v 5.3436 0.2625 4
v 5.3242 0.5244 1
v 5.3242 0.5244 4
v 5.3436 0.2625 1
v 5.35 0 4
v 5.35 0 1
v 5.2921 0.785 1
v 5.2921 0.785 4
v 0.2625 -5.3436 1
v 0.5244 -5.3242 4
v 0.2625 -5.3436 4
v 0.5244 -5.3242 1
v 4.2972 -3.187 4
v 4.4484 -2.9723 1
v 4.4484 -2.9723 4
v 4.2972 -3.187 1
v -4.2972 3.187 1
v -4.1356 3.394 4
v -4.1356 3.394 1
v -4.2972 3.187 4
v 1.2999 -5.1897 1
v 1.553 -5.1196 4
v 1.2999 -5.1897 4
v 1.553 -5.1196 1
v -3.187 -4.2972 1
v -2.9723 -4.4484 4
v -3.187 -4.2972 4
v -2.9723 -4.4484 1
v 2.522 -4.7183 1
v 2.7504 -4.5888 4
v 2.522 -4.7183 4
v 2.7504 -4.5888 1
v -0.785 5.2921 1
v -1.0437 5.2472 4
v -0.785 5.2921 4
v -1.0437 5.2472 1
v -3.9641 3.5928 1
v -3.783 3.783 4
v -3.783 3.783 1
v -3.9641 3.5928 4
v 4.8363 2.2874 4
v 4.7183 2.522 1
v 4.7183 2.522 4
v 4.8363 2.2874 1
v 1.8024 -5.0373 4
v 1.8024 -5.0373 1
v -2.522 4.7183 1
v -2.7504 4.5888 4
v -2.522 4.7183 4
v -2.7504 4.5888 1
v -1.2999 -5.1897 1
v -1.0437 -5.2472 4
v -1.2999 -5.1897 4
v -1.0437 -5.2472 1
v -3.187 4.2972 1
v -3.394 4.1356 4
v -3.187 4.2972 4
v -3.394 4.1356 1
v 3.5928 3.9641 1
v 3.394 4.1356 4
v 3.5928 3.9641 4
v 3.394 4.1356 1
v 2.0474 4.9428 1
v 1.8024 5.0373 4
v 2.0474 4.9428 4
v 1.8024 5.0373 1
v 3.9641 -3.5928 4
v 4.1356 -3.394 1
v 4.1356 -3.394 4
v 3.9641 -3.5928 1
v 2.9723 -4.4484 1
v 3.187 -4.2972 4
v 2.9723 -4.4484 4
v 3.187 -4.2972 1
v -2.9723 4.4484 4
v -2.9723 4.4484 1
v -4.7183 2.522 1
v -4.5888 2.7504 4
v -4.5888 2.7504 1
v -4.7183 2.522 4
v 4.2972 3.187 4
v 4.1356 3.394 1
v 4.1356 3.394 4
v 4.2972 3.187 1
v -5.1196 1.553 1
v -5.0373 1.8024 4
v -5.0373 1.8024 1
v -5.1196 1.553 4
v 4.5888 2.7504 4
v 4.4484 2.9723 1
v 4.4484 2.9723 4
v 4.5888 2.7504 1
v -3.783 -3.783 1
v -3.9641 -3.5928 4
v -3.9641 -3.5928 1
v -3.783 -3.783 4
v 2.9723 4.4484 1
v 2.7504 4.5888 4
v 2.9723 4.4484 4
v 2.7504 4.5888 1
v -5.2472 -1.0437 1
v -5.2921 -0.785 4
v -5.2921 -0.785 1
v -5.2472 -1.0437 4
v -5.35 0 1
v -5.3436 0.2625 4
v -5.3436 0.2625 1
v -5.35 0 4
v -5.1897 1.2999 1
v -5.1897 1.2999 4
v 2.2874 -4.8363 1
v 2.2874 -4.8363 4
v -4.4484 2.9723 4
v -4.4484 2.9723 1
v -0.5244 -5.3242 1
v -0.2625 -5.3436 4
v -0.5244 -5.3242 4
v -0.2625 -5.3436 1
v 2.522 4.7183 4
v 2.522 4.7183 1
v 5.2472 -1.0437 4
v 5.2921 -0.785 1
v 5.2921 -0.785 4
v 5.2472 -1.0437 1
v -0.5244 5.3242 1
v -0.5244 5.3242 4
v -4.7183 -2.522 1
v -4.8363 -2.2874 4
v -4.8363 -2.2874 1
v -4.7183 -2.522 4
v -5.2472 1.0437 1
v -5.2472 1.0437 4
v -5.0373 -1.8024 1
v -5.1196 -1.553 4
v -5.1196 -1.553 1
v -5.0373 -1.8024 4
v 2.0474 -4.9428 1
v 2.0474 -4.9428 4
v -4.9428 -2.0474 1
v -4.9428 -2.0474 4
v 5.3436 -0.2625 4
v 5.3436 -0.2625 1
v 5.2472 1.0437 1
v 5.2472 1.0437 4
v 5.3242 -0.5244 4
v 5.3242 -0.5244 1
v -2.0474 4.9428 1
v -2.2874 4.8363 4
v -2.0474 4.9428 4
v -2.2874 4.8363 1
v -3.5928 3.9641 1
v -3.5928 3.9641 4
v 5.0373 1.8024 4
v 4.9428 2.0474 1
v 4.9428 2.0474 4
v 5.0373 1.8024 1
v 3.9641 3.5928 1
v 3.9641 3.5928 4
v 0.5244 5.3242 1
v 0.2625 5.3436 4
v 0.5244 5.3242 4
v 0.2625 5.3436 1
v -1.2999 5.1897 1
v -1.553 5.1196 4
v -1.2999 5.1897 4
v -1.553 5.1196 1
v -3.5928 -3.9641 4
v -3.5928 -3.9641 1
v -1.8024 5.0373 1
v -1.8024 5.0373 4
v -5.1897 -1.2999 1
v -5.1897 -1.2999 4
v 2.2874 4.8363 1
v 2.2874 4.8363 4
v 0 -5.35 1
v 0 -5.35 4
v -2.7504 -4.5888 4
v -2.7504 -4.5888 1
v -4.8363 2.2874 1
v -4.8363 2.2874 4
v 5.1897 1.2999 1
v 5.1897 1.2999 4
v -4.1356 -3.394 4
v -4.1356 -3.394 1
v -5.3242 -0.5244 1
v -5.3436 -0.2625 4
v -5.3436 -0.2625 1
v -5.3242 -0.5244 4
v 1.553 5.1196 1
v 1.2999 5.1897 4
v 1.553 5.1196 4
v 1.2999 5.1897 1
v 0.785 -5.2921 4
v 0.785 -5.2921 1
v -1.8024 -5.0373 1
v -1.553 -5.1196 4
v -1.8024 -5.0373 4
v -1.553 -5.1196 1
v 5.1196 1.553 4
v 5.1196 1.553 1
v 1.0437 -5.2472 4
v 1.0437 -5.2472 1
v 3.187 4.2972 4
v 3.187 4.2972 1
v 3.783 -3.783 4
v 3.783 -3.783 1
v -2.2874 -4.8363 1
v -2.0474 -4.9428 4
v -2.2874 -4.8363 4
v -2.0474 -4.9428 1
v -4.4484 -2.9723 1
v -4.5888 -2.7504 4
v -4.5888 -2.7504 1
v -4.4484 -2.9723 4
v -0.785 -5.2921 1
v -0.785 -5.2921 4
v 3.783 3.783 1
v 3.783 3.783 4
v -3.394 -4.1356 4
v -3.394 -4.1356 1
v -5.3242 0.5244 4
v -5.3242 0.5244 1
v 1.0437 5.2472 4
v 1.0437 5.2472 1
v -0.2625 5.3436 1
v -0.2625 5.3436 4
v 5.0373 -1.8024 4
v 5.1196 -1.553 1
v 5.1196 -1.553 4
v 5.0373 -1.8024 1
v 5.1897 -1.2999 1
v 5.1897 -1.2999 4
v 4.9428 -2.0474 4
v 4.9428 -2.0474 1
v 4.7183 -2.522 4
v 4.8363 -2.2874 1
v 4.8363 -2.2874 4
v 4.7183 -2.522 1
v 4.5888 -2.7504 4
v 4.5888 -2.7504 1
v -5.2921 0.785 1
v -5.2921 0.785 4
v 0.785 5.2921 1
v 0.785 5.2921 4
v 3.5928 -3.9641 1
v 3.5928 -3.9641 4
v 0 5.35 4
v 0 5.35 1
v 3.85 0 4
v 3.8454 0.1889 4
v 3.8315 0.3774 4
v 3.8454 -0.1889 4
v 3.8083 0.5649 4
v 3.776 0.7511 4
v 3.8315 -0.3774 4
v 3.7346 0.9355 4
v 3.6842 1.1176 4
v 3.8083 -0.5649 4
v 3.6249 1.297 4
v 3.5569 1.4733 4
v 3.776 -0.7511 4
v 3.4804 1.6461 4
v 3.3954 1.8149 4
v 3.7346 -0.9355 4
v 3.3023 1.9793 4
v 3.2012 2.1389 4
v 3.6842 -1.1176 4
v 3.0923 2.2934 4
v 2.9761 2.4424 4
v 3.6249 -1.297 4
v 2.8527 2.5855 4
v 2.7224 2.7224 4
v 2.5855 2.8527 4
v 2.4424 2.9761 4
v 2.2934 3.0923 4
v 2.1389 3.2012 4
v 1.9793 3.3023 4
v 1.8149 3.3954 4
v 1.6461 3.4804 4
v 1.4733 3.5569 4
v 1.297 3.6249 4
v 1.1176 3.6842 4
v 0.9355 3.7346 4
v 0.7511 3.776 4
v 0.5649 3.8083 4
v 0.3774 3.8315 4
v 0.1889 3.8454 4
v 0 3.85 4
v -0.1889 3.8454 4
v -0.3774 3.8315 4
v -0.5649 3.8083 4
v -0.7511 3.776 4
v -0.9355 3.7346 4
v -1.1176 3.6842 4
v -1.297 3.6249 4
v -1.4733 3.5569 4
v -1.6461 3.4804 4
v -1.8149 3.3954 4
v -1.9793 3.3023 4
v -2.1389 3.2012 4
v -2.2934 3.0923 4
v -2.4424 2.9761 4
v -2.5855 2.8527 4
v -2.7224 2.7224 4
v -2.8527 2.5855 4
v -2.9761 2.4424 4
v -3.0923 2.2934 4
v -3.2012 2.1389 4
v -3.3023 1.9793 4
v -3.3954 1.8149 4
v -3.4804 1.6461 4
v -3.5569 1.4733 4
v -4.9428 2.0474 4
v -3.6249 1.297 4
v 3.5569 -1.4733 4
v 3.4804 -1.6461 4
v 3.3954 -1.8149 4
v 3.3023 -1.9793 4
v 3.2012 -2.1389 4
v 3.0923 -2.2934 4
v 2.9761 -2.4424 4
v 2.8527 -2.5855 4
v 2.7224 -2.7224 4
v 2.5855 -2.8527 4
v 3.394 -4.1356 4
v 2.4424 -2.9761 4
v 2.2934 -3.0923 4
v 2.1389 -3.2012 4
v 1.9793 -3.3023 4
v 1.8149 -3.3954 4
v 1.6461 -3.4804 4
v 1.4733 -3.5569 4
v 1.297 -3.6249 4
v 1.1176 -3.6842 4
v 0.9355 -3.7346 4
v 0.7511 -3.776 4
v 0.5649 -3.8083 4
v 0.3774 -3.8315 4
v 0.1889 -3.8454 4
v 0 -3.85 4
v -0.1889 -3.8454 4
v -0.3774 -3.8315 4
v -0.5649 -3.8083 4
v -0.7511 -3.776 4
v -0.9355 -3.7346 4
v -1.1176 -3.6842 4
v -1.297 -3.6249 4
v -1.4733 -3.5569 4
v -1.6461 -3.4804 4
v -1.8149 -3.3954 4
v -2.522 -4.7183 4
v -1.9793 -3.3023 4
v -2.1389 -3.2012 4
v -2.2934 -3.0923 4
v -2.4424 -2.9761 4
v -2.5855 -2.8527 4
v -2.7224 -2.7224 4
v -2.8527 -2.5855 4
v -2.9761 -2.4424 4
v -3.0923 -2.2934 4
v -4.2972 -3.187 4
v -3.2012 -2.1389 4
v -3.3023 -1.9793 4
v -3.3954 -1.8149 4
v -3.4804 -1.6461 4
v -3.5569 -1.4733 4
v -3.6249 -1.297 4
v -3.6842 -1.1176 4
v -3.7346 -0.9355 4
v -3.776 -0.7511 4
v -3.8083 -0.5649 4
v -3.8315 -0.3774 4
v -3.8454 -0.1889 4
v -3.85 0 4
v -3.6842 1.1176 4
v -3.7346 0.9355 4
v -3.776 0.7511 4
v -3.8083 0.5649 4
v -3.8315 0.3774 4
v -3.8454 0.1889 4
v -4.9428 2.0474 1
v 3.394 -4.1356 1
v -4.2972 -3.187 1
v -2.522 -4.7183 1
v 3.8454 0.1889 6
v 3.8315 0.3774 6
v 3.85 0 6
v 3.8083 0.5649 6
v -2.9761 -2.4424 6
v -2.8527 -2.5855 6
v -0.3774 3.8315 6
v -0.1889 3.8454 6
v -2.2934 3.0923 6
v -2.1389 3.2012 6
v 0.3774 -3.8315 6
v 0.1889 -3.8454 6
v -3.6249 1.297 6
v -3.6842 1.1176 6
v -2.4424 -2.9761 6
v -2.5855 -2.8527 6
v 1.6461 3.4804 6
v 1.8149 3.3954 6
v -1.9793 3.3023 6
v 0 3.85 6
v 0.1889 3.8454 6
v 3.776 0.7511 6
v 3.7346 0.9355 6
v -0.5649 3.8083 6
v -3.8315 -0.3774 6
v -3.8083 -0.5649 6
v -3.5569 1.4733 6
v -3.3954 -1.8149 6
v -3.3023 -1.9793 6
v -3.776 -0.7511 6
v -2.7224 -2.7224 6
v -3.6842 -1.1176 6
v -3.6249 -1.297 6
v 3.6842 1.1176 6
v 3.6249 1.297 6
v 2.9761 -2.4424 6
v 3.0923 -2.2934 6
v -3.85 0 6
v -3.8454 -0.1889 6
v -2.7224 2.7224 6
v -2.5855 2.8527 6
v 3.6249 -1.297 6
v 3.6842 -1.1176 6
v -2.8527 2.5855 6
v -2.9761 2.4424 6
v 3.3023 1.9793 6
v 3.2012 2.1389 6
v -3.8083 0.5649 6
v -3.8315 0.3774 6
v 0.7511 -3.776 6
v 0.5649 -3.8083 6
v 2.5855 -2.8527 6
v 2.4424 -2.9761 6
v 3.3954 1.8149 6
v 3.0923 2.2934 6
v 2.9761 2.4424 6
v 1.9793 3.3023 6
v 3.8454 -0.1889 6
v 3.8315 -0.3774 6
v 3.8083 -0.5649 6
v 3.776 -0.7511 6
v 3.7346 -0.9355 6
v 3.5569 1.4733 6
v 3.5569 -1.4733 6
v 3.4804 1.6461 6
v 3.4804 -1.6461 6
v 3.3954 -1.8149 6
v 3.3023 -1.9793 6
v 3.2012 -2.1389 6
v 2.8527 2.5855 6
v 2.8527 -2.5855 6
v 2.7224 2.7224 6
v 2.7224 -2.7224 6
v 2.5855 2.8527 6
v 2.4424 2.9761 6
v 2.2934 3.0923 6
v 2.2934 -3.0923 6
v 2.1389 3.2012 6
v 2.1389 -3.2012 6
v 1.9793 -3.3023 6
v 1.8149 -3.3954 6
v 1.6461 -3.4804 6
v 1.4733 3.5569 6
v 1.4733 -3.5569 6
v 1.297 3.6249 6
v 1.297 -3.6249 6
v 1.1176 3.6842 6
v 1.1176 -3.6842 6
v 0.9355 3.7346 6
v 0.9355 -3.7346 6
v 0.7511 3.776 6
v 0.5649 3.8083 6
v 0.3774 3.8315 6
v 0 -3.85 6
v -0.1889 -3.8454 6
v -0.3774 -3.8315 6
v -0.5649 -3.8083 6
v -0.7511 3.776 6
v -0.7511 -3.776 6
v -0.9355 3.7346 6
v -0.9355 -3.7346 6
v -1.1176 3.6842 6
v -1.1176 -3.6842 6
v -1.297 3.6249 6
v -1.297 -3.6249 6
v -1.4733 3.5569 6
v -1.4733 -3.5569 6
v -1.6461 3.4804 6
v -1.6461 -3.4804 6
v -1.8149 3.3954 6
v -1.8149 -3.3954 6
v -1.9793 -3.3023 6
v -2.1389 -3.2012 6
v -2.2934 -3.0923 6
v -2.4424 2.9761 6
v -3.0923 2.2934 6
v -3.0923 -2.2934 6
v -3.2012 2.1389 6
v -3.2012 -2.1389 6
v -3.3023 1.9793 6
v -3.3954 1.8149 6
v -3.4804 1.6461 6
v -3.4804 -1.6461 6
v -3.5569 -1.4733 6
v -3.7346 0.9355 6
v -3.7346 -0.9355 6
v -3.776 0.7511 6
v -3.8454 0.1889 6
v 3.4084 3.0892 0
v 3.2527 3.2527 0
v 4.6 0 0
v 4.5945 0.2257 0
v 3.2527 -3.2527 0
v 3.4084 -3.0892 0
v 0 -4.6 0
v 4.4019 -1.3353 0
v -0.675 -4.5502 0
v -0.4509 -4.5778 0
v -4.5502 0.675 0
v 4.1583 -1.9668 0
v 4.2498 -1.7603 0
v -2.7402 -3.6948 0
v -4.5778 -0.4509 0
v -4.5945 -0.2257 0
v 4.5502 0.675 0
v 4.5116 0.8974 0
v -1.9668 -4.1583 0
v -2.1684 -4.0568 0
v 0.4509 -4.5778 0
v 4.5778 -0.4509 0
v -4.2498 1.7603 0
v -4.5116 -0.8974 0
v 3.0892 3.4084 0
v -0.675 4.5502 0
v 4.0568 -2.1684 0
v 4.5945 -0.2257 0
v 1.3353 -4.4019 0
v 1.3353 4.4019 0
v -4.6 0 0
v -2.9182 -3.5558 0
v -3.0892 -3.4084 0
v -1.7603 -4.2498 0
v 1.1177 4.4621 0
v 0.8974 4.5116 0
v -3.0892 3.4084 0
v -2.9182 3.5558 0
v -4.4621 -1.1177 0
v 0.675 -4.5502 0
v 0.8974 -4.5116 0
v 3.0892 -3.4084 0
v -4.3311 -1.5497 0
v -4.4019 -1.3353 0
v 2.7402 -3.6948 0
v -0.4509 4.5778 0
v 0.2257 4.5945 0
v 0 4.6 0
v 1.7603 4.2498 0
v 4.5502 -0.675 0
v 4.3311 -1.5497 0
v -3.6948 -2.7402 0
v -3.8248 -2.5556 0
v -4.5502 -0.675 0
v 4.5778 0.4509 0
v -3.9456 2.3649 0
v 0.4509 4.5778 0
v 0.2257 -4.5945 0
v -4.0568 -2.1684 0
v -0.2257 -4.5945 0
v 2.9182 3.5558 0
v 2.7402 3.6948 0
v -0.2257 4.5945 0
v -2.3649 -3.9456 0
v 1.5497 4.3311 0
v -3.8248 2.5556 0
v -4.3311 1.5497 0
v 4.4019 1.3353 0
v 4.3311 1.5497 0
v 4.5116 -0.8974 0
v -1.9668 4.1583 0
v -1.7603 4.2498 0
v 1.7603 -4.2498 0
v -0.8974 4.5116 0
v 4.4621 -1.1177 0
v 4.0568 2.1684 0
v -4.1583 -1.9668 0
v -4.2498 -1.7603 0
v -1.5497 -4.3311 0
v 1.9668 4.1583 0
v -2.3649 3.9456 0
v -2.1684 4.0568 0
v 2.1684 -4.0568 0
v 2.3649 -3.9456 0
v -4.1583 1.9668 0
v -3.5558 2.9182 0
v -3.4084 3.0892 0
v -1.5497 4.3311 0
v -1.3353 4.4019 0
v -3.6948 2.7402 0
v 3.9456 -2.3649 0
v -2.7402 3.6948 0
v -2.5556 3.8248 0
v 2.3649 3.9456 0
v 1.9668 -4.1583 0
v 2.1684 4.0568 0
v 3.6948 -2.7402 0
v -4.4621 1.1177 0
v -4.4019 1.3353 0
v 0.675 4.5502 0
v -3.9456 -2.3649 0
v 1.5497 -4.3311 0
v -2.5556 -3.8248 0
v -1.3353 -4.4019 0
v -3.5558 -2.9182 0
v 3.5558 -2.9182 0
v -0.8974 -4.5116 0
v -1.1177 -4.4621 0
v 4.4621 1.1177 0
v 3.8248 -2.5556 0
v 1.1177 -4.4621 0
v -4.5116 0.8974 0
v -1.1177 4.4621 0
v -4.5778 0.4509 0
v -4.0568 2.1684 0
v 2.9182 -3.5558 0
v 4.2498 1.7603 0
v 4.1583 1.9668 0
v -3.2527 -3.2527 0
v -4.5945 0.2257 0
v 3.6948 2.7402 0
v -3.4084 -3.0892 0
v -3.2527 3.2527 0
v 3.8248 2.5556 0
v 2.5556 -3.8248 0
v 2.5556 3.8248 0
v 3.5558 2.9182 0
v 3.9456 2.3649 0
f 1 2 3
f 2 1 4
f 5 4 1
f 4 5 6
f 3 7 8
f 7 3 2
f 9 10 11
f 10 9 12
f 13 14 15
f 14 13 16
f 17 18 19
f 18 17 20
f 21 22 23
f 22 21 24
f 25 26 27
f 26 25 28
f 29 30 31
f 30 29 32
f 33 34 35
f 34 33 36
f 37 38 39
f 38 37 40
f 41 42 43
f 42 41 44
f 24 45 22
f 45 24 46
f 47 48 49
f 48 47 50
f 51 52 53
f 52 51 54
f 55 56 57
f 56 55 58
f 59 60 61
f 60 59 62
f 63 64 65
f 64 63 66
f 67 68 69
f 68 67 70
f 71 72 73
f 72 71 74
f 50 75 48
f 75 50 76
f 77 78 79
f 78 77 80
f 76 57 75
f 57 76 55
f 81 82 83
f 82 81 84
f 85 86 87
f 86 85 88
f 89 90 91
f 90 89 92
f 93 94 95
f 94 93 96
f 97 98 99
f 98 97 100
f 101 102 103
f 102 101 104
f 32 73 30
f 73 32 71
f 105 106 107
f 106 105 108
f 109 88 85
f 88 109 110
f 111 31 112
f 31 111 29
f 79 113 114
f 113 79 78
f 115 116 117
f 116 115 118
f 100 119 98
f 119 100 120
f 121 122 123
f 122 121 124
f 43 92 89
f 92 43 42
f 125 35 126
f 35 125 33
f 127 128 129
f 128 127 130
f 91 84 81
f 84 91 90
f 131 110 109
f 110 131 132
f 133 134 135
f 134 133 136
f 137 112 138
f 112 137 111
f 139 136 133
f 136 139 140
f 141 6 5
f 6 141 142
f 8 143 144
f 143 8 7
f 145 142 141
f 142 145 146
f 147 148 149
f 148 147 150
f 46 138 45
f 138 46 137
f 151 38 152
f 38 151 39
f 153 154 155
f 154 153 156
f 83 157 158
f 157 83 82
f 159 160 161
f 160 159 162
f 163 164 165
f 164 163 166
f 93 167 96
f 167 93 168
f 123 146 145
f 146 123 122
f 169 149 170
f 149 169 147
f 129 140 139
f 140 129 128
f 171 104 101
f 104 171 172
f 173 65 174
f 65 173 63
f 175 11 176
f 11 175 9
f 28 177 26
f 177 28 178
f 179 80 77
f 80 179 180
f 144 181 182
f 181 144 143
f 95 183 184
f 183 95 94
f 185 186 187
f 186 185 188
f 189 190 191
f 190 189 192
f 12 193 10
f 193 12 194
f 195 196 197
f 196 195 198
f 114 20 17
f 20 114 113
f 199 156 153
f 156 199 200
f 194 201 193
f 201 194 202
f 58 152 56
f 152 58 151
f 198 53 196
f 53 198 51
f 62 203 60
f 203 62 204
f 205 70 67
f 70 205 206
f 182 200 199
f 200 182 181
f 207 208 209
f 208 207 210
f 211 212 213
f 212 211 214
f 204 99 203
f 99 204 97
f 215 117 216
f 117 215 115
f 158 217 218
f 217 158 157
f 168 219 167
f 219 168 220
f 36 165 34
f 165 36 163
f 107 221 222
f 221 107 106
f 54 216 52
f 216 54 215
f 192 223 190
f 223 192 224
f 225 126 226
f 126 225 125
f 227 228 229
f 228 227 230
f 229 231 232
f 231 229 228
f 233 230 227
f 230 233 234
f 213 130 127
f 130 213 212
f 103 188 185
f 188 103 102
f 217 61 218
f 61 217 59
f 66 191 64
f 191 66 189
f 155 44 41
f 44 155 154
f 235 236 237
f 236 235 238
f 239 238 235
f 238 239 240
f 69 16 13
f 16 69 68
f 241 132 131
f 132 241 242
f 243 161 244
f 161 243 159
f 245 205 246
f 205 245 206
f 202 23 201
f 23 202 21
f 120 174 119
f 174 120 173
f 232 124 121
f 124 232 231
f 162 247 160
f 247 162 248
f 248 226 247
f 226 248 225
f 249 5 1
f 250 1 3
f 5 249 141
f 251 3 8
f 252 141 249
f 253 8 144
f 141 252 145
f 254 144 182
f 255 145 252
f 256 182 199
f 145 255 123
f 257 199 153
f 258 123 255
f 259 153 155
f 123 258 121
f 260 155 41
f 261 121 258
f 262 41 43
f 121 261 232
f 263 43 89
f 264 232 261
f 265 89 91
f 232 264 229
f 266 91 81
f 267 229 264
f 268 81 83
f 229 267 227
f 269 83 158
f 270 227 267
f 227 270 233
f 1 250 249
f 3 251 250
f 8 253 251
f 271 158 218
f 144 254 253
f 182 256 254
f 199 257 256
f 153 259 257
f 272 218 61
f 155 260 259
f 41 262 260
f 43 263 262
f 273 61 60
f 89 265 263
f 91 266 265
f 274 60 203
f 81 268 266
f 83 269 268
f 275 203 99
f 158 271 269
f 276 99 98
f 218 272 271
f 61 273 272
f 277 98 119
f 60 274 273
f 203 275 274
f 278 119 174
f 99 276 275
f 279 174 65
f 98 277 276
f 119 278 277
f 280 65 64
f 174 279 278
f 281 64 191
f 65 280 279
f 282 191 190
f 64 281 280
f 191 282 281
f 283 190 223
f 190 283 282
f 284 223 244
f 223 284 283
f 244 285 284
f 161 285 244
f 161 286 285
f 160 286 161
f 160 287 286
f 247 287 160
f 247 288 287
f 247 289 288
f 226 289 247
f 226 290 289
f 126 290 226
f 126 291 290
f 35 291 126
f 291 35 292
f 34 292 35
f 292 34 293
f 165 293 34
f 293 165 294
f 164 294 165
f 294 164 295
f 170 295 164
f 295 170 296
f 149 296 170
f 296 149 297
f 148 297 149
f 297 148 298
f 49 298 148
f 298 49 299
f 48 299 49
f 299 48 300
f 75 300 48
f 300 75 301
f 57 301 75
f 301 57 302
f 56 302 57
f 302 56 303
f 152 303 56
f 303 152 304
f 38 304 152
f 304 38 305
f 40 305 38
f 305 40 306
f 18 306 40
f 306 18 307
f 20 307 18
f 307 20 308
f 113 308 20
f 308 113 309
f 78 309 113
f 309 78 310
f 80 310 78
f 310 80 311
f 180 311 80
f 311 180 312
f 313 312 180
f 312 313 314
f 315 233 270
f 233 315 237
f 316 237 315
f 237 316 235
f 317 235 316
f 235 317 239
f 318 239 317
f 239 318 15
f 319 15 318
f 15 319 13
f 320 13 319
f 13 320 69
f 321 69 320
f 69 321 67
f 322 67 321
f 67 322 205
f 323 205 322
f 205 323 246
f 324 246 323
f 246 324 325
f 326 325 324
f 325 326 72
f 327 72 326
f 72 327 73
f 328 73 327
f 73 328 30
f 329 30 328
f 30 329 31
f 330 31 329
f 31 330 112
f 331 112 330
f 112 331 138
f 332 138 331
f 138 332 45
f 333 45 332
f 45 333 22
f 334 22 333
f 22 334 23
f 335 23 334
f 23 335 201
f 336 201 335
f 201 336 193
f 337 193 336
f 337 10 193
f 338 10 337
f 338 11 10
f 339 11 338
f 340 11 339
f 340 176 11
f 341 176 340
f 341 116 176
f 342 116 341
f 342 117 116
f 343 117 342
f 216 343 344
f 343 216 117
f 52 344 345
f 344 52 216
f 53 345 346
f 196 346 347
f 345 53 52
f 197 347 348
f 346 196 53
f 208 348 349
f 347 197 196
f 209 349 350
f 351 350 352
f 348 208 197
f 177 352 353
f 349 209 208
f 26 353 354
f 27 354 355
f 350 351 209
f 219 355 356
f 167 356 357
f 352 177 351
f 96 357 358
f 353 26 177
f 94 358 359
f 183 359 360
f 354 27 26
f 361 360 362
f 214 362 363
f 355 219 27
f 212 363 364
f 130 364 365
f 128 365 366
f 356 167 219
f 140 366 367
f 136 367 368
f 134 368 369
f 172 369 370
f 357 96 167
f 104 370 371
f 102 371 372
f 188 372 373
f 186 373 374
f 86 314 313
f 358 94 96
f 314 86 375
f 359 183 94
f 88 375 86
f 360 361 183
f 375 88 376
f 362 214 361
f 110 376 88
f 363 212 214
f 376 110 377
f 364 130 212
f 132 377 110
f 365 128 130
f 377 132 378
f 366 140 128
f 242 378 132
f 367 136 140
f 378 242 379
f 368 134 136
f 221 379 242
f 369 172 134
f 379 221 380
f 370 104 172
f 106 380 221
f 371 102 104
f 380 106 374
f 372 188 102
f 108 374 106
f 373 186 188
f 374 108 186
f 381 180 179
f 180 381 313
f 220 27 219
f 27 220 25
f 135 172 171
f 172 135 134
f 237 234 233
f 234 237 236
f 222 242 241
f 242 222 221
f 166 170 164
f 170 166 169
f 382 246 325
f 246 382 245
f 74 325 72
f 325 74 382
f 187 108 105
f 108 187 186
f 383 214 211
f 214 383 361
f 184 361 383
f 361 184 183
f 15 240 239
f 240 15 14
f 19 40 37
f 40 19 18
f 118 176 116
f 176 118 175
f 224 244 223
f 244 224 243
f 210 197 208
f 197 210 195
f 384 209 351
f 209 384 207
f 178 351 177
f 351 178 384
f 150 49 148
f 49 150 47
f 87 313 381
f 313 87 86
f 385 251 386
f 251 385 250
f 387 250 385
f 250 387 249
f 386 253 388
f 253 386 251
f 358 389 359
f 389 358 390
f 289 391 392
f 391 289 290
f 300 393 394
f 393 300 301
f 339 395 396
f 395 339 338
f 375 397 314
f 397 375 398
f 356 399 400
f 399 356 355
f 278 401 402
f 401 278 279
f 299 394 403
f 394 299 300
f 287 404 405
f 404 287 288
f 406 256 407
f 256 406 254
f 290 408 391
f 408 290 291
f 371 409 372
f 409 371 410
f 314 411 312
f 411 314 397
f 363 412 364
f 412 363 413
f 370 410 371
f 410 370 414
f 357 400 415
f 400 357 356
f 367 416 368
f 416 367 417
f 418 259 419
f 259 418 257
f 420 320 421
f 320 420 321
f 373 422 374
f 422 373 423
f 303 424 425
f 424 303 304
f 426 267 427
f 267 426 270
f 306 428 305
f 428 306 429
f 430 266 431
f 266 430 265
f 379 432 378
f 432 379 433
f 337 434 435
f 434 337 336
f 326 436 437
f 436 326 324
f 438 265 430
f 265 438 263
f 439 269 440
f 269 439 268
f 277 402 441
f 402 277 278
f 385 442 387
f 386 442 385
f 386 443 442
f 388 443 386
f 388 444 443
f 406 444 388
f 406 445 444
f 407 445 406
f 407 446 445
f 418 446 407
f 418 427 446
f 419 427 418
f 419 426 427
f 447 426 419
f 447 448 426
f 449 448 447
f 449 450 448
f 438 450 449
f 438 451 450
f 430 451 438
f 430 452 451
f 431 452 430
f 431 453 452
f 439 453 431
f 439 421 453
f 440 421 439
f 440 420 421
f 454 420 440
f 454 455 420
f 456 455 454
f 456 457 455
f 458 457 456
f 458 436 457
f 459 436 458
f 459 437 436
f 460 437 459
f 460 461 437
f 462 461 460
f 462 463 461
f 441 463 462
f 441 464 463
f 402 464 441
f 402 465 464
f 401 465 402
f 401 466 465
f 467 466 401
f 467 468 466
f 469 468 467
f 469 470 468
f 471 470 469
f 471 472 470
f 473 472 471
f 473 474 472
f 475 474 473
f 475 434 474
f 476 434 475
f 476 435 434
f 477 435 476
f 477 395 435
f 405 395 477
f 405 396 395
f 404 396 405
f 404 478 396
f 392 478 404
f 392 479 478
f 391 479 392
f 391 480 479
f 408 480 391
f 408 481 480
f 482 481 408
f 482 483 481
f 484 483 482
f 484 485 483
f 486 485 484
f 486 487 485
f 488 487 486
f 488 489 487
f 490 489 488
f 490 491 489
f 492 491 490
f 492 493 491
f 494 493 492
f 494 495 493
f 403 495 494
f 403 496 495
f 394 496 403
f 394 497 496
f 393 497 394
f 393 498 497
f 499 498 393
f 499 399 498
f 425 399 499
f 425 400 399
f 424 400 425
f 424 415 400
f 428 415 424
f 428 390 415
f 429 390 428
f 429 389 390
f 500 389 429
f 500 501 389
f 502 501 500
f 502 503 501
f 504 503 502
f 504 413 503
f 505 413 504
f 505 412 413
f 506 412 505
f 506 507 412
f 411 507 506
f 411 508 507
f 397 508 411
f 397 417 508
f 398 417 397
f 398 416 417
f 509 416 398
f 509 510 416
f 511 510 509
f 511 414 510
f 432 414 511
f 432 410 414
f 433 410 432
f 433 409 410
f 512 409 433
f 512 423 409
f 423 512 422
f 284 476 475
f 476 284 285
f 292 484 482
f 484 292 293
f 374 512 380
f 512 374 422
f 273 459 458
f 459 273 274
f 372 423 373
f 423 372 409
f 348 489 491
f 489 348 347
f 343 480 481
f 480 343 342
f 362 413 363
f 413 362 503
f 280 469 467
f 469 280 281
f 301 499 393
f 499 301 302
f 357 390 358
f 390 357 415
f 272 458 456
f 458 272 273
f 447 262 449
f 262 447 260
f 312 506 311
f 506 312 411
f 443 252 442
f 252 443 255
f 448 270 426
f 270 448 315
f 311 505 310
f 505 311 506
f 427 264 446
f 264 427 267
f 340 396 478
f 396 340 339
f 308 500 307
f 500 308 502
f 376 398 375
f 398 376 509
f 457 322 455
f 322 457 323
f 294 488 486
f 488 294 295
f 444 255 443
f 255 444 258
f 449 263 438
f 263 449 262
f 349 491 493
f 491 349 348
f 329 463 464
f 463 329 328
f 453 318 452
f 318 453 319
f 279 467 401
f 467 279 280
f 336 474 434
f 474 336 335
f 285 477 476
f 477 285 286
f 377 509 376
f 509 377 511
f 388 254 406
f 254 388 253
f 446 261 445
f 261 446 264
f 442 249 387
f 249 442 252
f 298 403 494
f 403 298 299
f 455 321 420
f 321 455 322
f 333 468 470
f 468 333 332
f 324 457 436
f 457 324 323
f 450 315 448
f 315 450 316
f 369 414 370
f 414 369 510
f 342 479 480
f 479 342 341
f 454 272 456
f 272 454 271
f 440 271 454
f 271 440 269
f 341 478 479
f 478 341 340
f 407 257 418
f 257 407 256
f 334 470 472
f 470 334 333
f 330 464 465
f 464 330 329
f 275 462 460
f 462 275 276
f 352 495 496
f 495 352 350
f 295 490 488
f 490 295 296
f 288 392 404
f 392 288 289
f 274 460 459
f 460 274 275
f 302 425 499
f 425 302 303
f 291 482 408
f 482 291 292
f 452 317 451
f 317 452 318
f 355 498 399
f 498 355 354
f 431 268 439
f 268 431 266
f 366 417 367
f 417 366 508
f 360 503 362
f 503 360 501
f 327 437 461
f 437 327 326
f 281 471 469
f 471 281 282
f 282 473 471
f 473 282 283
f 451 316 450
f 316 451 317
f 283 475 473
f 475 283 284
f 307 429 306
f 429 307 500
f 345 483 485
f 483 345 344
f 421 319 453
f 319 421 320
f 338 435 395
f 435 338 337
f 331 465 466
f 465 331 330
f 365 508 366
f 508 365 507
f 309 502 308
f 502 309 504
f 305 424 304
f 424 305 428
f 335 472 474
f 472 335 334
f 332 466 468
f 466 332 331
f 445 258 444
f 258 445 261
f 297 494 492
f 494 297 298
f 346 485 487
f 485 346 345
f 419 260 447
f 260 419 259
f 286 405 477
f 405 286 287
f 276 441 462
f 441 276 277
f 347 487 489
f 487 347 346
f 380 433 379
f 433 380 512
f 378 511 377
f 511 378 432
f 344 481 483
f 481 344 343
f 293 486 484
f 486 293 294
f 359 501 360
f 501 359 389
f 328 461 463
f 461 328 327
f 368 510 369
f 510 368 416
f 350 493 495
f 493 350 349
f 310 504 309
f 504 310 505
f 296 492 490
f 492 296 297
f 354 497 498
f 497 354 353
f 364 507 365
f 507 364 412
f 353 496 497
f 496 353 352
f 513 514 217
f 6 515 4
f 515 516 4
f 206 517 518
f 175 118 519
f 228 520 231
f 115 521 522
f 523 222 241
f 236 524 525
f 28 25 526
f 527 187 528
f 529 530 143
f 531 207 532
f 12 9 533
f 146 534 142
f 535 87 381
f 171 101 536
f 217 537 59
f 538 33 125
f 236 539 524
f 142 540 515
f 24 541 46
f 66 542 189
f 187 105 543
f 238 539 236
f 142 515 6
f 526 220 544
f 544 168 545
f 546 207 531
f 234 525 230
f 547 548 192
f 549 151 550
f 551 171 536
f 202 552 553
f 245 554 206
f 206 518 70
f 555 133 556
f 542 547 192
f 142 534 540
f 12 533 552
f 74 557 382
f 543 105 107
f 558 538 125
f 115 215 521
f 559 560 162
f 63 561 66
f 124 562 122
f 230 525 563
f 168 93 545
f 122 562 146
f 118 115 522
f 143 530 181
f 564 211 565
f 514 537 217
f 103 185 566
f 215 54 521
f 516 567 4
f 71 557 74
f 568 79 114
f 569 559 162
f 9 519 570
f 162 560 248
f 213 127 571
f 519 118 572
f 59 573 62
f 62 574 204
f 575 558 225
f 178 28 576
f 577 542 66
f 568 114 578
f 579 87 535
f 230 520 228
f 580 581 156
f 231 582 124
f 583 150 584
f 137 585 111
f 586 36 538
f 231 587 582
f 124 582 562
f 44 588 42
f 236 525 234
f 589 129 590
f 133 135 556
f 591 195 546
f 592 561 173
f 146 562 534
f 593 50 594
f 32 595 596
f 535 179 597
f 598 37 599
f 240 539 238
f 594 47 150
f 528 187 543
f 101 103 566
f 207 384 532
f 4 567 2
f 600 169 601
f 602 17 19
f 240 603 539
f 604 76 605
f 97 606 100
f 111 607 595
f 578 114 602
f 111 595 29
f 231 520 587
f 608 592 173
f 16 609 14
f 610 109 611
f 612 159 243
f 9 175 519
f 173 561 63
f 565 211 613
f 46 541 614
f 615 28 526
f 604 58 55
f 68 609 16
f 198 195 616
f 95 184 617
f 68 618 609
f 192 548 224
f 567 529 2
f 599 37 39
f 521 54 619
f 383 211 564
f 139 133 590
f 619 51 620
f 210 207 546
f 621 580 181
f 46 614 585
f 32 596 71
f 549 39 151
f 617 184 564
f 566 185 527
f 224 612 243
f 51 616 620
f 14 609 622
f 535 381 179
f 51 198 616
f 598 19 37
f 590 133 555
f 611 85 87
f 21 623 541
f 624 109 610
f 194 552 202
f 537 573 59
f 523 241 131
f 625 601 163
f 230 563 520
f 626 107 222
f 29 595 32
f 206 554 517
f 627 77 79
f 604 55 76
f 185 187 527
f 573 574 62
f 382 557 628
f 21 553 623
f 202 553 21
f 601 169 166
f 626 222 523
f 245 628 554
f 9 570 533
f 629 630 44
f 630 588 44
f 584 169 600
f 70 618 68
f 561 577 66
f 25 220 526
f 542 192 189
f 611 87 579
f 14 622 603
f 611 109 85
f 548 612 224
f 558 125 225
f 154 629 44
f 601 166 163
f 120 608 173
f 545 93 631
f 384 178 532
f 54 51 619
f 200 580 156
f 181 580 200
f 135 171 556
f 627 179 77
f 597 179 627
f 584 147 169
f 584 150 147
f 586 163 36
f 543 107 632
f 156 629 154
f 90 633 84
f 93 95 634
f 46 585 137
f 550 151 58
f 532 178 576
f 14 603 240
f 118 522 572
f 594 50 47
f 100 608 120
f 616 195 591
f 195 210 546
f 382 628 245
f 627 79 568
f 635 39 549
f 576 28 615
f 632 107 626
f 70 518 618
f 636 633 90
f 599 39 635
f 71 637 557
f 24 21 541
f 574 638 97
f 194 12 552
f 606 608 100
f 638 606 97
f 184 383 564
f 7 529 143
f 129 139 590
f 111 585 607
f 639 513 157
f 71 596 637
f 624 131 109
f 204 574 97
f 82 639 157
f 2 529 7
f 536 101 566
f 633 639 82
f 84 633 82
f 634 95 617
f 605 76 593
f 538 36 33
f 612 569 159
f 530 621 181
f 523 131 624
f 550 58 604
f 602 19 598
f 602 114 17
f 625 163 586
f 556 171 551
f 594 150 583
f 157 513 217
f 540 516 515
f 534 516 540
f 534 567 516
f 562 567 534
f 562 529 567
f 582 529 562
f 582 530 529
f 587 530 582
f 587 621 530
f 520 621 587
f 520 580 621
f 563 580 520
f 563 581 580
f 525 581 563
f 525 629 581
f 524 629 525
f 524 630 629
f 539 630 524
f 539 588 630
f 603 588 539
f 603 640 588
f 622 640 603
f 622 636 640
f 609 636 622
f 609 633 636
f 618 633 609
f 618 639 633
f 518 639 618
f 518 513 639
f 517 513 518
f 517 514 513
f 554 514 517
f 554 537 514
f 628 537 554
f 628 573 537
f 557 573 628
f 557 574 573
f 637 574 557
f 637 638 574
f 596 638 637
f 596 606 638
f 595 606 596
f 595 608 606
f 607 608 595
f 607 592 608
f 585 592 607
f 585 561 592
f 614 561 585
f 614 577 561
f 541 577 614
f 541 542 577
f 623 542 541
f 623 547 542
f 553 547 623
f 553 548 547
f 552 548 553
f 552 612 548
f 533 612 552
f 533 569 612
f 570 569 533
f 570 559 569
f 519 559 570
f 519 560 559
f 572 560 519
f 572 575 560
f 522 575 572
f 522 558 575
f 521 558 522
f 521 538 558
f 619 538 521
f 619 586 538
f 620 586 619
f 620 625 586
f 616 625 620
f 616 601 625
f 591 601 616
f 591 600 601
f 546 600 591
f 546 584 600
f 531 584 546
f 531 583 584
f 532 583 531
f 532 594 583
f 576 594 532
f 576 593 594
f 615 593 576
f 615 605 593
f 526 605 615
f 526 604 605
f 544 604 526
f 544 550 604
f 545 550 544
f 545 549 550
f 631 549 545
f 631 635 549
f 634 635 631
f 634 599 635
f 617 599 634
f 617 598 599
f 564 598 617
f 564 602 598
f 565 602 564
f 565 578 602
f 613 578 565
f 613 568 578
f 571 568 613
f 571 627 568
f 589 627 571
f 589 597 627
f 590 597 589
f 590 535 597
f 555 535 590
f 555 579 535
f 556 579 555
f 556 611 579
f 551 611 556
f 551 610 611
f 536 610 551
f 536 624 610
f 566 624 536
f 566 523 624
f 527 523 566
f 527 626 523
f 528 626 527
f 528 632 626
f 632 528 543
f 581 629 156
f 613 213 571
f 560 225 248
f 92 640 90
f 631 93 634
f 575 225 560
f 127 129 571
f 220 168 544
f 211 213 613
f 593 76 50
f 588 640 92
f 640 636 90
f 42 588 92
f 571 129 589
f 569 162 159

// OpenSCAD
// file: dim.scad
MM_TO_INCHES = 1 / 25.4;
INCHES_TO_MM = 25.4;

D_FORWARD			= 1.00 * INCHES_TO_MM;
D_AFT				= 31.4;
R_FORWARD 			= D_FORWARD / 2;
R_AFT 				= D_AFT / 2;
D_SABER_OUTER		= 37.5;

D_PORT_SCREW		= 0.5 * INCHES_TO_MM;
R_PORT_SCREW 		= D_PORT_SCREW / 2;

FACES 				= 90;
GAP					= 0.300;
// file: ../shapes.scad
	FACES = 180;
EPSILON = 0.1;

module tube(p_h, rOuter, rInner) {
	difference() {
		cylinder(h=p_h, r=rOuter, $fn=FACES);
		translate([0,0,-EPSILON]) {
			cylinder(h=p_h + EPSILON*2, r=rInner, $fn=FACES);
		}
	}
}

/*
needs a 2016 version.	
module tubeArc(deg, p_h, rOuter, rInner) {
	//rotate([90,0,0]) {
		rotate_extrude(angle=30) {
			translate([rInner,0,0]) {
				square(size=[rOuter-rInner, p_h], center=false);
			}
		}
	//}
}
*/
// main file
use <../threads.scad>
use <../shapes.scad>
include <dim.scad>

H_BARREL_UPPER = 2;
H_BARREL_BODY = 3;
H_BARREL_LOWER = 1;

D_THREAD = 13;
T_WALL = 2;
T_LIP = 3;
T_OUTER_LIP = 2;
T_LOWER_SPACE = 1.5;

D_BARREL_UPPER = D_THREAD - T_WALL - T_LIP - GAP;
D_BARREL_BODY  = D_THREAD - T_WALL - GAP;
D_BARREL_LOWER = D_THREAD - T_WALL - T_LOWER_SPACE - GAP;

union() {
    cylinder(h=H_BARREL_LOWER, r1=D_BARREL_LOWER/2, r2=D_BARREL_BODY/2, $fn=128);
    translate([0,0,H_BARREL_LOWER]) {
        cylinder(h=H_BARREL_BODY, r=D_BARREL_BODY/2, $fn=128);
        translate([0,0,H_BARREL_BODY]) {
            cylinder(h=H_BARREL_UPPER, r=D_BARREL_UPPER/2, $fn=128);
        }
    }
}

*color("green"){
    tube(H_BARREL_LOWER + H_BARREL_BODY, D_THREAD / 2, (D_THREAD - T_WALL)/2);
    translate([0,0,H_BARREL_LOWER + H_BARREL_BODY]) {
        tube(H_BARREL_UPPER, (T_OUTER_LIP + D_THREAD) / 2, (D_THREAD - T_WALL - T_LIP)/2);
    }
}
